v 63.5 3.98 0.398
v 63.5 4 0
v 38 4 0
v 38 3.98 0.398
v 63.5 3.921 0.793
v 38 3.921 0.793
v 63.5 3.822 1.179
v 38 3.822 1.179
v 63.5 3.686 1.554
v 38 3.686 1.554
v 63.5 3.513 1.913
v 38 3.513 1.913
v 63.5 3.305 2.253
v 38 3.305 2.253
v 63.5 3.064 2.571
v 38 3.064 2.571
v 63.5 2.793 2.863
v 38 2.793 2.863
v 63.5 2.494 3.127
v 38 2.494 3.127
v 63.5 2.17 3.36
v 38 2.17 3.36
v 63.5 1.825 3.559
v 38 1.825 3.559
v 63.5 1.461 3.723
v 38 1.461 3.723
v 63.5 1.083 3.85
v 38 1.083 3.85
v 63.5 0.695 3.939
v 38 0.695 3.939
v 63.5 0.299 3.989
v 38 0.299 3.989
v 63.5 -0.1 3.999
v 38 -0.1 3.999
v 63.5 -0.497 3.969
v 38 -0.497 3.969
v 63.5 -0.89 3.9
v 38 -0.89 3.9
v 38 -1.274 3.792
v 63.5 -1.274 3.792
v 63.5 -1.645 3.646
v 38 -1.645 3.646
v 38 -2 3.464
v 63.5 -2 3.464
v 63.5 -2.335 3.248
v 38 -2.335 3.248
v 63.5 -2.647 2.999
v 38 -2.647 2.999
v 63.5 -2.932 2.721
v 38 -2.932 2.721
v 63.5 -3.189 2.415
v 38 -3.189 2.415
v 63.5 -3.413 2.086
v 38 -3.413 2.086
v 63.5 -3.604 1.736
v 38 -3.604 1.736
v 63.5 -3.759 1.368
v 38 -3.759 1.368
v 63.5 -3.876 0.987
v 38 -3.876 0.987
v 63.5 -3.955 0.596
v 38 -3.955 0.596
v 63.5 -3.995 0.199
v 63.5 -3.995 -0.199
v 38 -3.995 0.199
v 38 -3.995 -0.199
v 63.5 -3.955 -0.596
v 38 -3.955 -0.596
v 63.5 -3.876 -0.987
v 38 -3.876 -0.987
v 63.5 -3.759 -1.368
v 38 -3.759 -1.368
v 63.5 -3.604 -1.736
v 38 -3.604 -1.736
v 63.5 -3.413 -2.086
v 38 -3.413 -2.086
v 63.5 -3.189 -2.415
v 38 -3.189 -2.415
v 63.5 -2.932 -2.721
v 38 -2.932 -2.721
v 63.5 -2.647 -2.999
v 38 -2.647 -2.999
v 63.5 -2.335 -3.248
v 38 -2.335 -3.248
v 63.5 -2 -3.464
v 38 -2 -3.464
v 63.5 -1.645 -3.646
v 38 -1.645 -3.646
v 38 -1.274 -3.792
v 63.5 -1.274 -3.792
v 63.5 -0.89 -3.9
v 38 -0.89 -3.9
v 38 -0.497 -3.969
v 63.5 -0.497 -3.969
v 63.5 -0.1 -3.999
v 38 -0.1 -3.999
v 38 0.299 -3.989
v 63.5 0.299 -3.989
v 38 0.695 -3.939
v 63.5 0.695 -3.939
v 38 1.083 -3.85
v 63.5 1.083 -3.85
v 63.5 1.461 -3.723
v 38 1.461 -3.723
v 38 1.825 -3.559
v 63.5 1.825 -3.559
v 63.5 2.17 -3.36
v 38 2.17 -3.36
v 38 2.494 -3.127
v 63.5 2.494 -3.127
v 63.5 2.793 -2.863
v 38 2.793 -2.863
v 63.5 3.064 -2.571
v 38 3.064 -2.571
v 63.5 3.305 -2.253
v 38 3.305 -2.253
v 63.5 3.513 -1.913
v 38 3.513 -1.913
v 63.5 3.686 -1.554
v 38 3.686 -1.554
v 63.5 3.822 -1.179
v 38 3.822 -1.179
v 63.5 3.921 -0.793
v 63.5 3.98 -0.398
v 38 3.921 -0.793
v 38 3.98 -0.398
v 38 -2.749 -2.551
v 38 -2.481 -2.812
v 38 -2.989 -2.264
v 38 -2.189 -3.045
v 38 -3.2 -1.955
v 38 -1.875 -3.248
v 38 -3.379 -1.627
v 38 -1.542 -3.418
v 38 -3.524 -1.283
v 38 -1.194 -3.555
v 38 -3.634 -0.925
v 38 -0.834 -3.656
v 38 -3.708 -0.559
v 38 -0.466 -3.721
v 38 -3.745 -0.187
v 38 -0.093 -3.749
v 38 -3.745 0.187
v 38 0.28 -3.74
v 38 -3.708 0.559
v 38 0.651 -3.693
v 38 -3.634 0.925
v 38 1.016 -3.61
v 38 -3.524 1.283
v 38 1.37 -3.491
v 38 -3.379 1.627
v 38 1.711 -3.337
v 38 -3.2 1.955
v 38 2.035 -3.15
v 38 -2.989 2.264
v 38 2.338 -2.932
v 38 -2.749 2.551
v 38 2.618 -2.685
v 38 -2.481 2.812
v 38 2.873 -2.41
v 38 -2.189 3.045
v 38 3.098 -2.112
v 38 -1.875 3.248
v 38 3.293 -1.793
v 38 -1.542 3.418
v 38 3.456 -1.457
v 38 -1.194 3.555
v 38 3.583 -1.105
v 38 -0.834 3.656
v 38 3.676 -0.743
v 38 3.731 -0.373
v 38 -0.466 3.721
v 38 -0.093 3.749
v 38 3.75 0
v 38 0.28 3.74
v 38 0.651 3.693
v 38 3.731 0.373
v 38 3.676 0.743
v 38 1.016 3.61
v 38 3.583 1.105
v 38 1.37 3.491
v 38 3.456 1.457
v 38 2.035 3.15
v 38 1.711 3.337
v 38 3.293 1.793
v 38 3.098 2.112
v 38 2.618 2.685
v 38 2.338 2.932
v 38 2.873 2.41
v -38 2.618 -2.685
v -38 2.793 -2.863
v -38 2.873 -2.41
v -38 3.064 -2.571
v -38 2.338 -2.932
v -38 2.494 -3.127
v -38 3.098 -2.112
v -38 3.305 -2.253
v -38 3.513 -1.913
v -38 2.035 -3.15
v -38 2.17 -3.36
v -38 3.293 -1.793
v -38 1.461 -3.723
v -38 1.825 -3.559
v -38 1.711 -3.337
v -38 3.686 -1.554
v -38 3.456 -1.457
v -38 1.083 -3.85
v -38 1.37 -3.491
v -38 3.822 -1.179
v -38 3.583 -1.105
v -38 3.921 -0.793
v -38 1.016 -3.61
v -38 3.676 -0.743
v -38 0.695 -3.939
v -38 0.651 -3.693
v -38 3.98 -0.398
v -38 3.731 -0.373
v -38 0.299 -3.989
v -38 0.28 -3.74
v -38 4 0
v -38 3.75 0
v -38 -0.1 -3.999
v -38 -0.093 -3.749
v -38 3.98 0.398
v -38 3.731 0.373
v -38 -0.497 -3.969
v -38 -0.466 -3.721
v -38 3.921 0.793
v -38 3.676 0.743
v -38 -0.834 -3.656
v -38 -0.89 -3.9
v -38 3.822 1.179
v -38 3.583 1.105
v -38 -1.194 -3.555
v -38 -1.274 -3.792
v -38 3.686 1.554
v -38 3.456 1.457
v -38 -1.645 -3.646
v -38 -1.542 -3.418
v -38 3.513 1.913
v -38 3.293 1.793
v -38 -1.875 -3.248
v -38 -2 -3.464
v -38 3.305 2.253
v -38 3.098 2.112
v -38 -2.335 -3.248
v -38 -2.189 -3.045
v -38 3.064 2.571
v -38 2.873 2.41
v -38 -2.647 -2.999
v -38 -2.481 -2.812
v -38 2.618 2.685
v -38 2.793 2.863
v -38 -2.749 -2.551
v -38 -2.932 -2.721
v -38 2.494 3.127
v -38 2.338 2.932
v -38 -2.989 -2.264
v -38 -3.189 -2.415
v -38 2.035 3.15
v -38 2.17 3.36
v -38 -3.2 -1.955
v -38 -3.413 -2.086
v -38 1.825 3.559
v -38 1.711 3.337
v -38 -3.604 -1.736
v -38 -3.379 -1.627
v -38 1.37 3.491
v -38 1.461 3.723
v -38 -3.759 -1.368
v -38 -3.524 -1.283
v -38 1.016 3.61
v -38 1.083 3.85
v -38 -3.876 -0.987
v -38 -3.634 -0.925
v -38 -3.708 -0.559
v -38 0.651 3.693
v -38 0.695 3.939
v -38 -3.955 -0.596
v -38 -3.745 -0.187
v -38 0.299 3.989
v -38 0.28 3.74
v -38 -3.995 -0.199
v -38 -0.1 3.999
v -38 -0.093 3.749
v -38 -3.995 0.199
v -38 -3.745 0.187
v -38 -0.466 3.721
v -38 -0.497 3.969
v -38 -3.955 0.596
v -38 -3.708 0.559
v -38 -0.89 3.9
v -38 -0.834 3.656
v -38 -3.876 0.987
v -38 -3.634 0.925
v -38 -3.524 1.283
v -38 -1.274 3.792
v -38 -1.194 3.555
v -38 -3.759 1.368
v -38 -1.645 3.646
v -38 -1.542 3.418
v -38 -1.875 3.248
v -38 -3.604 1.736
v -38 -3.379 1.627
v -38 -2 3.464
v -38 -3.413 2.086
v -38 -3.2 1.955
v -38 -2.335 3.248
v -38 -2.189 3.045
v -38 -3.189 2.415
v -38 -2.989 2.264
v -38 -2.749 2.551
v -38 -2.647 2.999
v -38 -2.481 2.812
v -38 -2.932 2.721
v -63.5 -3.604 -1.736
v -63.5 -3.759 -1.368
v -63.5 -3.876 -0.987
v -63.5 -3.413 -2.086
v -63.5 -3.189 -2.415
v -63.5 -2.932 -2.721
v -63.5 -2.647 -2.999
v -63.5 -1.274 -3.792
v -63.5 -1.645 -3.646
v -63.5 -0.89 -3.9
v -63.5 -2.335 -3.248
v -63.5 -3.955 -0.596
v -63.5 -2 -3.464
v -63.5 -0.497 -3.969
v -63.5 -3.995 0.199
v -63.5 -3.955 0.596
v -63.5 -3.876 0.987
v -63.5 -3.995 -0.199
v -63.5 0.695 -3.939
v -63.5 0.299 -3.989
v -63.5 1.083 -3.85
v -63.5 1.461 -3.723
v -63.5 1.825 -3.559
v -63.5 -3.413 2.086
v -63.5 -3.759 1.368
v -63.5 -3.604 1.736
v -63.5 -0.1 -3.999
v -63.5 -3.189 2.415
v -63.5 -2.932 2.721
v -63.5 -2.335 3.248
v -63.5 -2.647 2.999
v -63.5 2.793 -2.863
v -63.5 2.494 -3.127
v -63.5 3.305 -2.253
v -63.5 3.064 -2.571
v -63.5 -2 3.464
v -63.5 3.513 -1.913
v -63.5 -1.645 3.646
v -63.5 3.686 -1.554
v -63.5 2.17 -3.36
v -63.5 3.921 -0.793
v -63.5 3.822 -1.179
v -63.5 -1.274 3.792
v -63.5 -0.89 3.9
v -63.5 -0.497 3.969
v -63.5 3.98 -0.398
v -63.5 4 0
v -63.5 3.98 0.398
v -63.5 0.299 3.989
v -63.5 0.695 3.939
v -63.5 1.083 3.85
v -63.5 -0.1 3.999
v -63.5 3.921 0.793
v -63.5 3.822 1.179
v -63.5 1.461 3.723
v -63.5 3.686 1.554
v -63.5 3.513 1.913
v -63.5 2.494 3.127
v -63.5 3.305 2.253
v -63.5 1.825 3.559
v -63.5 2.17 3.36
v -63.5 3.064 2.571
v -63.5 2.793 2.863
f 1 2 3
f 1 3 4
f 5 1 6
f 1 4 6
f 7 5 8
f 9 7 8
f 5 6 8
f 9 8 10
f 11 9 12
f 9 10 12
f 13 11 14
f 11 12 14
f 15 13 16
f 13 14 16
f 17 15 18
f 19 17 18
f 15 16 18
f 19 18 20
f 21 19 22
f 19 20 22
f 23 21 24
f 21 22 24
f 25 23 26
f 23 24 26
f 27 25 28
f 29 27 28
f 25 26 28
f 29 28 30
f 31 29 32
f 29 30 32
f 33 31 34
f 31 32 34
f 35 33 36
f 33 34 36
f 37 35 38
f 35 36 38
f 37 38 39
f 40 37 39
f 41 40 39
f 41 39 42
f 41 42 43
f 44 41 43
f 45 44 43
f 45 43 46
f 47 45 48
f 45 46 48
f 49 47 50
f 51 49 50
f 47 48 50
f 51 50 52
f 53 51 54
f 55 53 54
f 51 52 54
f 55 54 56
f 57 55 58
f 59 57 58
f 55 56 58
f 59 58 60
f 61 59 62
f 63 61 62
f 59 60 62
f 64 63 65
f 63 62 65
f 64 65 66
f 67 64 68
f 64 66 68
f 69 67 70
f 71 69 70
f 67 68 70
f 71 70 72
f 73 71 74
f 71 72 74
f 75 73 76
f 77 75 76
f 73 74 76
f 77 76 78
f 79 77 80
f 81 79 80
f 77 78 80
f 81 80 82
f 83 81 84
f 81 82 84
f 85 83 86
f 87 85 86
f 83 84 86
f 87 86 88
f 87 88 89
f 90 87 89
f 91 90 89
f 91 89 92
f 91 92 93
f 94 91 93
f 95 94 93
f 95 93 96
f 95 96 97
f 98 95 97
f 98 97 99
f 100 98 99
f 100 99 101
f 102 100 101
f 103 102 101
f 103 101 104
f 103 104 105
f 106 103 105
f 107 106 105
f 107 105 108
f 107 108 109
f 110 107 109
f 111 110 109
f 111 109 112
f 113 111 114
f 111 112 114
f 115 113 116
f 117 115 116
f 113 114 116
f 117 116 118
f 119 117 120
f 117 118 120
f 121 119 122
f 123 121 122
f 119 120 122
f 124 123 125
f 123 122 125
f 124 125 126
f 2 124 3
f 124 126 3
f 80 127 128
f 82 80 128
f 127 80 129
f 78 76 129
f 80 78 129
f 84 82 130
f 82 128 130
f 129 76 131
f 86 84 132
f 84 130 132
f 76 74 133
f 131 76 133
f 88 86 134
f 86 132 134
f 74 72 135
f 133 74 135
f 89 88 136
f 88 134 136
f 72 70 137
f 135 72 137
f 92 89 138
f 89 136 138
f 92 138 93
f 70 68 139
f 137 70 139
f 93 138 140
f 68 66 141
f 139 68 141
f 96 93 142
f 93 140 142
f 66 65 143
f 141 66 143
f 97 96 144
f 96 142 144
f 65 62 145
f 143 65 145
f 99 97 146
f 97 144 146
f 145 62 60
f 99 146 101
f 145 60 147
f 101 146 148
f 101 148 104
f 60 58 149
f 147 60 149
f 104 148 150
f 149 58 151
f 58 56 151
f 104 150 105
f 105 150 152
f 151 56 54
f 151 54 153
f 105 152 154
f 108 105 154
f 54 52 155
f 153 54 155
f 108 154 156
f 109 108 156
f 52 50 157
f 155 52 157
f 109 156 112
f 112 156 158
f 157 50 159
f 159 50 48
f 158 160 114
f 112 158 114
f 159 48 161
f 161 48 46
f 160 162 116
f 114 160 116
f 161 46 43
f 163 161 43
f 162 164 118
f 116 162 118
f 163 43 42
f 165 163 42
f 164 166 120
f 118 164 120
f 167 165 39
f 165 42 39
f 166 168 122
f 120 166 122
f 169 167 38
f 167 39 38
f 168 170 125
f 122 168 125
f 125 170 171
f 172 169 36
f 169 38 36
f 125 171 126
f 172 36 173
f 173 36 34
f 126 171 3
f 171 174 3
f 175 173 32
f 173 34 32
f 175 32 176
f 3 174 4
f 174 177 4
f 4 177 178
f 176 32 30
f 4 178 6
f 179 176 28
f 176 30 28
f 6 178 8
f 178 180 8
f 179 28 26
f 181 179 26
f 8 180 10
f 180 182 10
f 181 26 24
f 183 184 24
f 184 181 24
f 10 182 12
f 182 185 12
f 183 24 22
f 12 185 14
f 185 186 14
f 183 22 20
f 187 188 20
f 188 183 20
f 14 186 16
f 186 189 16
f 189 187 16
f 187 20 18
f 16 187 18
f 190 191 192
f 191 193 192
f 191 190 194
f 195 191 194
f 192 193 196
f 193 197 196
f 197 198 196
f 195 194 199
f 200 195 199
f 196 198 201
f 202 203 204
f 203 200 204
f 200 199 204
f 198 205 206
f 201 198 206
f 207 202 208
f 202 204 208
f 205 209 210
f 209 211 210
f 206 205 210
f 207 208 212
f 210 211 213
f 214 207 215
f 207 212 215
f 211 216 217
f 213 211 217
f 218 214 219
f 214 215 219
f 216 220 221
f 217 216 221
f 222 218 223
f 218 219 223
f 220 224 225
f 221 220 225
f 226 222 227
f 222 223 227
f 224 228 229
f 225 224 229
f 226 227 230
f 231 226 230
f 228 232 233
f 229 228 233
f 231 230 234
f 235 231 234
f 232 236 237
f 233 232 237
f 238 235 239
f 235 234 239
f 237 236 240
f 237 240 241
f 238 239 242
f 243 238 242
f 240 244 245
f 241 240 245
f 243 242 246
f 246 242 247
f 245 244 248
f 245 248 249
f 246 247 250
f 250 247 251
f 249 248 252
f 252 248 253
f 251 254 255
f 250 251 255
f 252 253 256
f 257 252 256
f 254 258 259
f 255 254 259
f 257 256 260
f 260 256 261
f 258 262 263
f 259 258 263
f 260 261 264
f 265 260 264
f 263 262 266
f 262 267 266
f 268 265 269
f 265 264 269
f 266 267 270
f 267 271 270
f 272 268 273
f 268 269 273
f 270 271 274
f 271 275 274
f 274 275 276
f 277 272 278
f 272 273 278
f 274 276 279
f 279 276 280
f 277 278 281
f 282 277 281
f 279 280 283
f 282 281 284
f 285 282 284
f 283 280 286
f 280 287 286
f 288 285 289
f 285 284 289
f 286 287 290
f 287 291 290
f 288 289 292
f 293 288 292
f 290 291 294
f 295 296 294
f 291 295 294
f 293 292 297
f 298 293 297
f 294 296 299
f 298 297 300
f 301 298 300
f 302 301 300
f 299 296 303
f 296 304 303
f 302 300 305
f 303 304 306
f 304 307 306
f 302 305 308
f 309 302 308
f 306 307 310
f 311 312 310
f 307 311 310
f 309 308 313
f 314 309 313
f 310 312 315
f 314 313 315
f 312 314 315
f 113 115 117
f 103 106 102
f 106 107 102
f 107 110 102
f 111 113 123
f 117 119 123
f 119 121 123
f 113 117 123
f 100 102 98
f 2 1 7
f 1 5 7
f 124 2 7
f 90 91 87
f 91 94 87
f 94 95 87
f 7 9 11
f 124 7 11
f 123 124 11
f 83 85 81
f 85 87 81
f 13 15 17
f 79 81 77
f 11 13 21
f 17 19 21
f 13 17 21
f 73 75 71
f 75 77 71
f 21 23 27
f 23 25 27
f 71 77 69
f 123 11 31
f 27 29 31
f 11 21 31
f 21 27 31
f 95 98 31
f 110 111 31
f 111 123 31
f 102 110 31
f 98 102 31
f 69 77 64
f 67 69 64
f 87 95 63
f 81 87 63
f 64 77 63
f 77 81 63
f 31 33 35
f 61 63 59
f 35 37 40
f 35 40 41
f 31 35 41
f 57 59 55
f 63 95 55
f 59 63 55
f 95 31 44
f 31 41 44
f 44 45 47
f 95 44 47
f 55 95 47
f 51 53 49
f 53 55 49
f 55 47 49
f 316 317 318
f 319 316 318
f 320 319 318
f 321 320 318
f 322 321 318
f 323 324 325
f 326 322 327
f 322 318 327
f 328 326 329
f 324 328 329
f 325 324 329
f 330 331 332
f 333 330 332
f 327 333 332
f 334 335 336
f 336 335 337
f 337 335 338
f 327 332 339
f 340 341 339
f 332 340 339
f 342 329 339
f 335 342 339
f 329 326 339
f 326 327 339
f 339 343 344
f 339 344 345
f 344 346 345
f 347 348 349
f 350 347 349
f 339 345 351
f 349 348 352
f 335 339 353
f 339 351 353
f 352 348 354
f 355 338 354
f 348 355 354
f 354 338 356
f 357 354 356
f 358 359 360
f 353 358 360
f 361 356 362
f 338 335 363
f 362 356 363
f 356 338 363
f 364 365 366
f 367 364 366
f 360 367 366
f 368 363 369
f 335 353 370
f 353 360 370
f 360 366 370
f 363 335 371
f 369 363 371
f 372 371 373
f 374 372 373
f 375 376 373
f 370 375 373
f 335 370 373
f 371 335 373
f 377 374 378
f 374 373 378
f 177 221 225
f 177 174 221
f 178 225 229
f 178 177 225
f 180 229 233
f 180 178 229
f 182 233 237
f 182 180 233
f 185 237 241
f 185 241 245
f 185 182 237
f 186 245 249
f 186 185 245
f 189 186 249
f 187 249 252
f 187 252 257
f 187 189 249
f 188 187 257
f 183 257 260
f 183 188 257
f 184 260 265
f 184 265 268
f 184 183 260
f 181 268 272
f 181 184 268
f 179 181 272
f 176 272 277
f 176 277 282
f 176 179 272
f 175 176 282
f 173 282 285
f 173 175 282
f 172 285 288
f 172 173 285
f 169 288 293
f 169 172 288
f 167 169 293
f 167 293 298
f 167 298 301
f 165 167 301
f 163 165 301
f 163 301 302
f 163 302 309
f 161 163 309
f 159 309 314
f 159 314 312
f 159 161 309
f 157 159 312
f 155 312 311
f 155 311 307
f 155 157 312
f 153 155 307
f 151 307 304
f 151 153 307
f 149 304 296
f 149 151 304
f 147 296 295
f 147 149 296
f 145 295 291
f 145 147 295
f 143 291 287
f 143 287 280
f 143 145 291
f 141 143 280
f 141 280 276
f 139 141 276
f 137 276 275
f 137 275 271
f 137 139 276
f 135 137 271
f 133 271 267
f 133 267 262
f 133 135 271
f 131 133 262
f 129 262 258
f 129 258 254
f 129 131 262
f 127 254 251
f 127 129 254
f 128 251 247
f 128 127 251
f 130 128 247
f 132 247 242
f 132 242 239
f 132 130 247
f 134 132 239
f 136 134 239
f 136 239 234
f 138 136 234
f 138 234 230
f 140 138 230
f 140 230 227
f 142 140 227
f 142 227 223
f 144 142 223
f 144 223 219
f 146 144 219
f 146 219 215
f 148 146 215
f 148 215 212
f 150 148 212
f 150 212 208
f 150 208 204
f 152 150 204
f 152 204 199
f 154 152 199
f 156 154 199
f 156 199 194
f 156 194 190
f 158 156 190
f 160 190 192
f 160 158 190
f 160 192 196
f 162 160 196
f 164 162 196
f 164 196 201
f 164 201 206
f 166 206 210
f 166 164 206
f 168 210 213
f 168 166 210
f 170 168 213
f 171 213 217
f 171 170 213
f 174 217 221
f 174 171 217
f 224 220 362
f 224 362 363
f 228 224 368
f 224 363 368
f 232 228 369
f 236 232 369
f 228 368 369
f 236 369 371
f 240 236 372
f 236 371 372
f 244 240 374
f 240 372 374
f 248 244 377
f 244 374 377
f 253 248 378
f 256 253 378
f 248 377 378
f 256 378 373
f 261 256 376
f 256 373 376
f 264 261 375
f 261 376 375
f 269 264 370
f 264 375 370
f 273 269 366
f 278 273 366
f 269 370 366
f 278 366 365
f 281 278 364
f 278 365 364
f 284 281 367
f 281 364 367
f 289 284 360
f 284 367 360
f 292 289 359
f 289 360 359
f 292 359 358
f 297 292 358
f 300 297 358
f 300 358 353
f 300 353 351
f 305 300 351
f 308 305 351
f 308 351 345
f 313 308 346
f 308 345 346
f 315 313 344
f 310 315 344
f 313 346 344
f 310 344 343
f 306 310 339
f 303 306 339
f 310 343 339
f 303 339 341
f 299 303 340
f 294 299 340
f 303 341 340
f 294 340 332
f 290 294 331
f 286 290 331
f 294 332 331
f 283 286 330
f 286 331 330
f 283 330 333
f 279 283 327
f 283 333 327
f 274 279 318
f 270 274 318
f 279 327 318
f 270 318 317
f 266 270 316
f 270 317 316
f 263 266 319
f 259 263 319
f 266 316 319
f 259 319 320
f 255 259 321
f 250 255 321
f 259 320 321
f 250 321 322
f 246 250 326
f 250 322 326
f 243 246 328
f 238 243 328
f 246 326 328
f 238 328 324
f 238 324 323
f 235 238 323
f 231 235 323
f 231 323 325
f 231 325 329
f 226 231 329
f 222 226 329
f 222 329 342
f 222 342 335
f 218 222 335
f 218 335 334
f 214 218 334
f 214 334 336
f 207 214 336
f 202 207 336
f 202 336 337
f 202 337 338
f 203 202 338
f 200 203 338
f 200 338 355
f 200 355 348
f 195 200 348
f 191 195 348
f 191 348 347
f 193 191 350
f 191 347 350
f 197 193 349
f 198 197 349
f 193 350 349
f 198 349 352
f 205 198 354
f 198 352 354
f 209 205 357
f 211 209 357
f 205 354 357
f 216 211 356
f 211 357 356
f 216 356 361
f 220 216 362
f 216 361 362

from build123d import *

# Parameters (mm, degrees)
F0_W = 76
F0_H = 3.75


with BuildPart() as f1:
    # F0 (on Top) → F1 (revolve)
    with BuildSketch(Plane.XY):
        Polygon((-63.5, 0), (-38, 0), (-38, 3.75), (-38, 4), (-63.5, 4), align=None)
        with Locations((0, 1.875)):
            Rectangle(F0_W, F0_H)
        Polygon((38, 0), (63.5, 0), (63.5, 4), (38, 4), (38, 3.75), align=None)
    revolve(axis=Axis((0, 0, 0), (1, 0, 0)))


solid = f1.part
